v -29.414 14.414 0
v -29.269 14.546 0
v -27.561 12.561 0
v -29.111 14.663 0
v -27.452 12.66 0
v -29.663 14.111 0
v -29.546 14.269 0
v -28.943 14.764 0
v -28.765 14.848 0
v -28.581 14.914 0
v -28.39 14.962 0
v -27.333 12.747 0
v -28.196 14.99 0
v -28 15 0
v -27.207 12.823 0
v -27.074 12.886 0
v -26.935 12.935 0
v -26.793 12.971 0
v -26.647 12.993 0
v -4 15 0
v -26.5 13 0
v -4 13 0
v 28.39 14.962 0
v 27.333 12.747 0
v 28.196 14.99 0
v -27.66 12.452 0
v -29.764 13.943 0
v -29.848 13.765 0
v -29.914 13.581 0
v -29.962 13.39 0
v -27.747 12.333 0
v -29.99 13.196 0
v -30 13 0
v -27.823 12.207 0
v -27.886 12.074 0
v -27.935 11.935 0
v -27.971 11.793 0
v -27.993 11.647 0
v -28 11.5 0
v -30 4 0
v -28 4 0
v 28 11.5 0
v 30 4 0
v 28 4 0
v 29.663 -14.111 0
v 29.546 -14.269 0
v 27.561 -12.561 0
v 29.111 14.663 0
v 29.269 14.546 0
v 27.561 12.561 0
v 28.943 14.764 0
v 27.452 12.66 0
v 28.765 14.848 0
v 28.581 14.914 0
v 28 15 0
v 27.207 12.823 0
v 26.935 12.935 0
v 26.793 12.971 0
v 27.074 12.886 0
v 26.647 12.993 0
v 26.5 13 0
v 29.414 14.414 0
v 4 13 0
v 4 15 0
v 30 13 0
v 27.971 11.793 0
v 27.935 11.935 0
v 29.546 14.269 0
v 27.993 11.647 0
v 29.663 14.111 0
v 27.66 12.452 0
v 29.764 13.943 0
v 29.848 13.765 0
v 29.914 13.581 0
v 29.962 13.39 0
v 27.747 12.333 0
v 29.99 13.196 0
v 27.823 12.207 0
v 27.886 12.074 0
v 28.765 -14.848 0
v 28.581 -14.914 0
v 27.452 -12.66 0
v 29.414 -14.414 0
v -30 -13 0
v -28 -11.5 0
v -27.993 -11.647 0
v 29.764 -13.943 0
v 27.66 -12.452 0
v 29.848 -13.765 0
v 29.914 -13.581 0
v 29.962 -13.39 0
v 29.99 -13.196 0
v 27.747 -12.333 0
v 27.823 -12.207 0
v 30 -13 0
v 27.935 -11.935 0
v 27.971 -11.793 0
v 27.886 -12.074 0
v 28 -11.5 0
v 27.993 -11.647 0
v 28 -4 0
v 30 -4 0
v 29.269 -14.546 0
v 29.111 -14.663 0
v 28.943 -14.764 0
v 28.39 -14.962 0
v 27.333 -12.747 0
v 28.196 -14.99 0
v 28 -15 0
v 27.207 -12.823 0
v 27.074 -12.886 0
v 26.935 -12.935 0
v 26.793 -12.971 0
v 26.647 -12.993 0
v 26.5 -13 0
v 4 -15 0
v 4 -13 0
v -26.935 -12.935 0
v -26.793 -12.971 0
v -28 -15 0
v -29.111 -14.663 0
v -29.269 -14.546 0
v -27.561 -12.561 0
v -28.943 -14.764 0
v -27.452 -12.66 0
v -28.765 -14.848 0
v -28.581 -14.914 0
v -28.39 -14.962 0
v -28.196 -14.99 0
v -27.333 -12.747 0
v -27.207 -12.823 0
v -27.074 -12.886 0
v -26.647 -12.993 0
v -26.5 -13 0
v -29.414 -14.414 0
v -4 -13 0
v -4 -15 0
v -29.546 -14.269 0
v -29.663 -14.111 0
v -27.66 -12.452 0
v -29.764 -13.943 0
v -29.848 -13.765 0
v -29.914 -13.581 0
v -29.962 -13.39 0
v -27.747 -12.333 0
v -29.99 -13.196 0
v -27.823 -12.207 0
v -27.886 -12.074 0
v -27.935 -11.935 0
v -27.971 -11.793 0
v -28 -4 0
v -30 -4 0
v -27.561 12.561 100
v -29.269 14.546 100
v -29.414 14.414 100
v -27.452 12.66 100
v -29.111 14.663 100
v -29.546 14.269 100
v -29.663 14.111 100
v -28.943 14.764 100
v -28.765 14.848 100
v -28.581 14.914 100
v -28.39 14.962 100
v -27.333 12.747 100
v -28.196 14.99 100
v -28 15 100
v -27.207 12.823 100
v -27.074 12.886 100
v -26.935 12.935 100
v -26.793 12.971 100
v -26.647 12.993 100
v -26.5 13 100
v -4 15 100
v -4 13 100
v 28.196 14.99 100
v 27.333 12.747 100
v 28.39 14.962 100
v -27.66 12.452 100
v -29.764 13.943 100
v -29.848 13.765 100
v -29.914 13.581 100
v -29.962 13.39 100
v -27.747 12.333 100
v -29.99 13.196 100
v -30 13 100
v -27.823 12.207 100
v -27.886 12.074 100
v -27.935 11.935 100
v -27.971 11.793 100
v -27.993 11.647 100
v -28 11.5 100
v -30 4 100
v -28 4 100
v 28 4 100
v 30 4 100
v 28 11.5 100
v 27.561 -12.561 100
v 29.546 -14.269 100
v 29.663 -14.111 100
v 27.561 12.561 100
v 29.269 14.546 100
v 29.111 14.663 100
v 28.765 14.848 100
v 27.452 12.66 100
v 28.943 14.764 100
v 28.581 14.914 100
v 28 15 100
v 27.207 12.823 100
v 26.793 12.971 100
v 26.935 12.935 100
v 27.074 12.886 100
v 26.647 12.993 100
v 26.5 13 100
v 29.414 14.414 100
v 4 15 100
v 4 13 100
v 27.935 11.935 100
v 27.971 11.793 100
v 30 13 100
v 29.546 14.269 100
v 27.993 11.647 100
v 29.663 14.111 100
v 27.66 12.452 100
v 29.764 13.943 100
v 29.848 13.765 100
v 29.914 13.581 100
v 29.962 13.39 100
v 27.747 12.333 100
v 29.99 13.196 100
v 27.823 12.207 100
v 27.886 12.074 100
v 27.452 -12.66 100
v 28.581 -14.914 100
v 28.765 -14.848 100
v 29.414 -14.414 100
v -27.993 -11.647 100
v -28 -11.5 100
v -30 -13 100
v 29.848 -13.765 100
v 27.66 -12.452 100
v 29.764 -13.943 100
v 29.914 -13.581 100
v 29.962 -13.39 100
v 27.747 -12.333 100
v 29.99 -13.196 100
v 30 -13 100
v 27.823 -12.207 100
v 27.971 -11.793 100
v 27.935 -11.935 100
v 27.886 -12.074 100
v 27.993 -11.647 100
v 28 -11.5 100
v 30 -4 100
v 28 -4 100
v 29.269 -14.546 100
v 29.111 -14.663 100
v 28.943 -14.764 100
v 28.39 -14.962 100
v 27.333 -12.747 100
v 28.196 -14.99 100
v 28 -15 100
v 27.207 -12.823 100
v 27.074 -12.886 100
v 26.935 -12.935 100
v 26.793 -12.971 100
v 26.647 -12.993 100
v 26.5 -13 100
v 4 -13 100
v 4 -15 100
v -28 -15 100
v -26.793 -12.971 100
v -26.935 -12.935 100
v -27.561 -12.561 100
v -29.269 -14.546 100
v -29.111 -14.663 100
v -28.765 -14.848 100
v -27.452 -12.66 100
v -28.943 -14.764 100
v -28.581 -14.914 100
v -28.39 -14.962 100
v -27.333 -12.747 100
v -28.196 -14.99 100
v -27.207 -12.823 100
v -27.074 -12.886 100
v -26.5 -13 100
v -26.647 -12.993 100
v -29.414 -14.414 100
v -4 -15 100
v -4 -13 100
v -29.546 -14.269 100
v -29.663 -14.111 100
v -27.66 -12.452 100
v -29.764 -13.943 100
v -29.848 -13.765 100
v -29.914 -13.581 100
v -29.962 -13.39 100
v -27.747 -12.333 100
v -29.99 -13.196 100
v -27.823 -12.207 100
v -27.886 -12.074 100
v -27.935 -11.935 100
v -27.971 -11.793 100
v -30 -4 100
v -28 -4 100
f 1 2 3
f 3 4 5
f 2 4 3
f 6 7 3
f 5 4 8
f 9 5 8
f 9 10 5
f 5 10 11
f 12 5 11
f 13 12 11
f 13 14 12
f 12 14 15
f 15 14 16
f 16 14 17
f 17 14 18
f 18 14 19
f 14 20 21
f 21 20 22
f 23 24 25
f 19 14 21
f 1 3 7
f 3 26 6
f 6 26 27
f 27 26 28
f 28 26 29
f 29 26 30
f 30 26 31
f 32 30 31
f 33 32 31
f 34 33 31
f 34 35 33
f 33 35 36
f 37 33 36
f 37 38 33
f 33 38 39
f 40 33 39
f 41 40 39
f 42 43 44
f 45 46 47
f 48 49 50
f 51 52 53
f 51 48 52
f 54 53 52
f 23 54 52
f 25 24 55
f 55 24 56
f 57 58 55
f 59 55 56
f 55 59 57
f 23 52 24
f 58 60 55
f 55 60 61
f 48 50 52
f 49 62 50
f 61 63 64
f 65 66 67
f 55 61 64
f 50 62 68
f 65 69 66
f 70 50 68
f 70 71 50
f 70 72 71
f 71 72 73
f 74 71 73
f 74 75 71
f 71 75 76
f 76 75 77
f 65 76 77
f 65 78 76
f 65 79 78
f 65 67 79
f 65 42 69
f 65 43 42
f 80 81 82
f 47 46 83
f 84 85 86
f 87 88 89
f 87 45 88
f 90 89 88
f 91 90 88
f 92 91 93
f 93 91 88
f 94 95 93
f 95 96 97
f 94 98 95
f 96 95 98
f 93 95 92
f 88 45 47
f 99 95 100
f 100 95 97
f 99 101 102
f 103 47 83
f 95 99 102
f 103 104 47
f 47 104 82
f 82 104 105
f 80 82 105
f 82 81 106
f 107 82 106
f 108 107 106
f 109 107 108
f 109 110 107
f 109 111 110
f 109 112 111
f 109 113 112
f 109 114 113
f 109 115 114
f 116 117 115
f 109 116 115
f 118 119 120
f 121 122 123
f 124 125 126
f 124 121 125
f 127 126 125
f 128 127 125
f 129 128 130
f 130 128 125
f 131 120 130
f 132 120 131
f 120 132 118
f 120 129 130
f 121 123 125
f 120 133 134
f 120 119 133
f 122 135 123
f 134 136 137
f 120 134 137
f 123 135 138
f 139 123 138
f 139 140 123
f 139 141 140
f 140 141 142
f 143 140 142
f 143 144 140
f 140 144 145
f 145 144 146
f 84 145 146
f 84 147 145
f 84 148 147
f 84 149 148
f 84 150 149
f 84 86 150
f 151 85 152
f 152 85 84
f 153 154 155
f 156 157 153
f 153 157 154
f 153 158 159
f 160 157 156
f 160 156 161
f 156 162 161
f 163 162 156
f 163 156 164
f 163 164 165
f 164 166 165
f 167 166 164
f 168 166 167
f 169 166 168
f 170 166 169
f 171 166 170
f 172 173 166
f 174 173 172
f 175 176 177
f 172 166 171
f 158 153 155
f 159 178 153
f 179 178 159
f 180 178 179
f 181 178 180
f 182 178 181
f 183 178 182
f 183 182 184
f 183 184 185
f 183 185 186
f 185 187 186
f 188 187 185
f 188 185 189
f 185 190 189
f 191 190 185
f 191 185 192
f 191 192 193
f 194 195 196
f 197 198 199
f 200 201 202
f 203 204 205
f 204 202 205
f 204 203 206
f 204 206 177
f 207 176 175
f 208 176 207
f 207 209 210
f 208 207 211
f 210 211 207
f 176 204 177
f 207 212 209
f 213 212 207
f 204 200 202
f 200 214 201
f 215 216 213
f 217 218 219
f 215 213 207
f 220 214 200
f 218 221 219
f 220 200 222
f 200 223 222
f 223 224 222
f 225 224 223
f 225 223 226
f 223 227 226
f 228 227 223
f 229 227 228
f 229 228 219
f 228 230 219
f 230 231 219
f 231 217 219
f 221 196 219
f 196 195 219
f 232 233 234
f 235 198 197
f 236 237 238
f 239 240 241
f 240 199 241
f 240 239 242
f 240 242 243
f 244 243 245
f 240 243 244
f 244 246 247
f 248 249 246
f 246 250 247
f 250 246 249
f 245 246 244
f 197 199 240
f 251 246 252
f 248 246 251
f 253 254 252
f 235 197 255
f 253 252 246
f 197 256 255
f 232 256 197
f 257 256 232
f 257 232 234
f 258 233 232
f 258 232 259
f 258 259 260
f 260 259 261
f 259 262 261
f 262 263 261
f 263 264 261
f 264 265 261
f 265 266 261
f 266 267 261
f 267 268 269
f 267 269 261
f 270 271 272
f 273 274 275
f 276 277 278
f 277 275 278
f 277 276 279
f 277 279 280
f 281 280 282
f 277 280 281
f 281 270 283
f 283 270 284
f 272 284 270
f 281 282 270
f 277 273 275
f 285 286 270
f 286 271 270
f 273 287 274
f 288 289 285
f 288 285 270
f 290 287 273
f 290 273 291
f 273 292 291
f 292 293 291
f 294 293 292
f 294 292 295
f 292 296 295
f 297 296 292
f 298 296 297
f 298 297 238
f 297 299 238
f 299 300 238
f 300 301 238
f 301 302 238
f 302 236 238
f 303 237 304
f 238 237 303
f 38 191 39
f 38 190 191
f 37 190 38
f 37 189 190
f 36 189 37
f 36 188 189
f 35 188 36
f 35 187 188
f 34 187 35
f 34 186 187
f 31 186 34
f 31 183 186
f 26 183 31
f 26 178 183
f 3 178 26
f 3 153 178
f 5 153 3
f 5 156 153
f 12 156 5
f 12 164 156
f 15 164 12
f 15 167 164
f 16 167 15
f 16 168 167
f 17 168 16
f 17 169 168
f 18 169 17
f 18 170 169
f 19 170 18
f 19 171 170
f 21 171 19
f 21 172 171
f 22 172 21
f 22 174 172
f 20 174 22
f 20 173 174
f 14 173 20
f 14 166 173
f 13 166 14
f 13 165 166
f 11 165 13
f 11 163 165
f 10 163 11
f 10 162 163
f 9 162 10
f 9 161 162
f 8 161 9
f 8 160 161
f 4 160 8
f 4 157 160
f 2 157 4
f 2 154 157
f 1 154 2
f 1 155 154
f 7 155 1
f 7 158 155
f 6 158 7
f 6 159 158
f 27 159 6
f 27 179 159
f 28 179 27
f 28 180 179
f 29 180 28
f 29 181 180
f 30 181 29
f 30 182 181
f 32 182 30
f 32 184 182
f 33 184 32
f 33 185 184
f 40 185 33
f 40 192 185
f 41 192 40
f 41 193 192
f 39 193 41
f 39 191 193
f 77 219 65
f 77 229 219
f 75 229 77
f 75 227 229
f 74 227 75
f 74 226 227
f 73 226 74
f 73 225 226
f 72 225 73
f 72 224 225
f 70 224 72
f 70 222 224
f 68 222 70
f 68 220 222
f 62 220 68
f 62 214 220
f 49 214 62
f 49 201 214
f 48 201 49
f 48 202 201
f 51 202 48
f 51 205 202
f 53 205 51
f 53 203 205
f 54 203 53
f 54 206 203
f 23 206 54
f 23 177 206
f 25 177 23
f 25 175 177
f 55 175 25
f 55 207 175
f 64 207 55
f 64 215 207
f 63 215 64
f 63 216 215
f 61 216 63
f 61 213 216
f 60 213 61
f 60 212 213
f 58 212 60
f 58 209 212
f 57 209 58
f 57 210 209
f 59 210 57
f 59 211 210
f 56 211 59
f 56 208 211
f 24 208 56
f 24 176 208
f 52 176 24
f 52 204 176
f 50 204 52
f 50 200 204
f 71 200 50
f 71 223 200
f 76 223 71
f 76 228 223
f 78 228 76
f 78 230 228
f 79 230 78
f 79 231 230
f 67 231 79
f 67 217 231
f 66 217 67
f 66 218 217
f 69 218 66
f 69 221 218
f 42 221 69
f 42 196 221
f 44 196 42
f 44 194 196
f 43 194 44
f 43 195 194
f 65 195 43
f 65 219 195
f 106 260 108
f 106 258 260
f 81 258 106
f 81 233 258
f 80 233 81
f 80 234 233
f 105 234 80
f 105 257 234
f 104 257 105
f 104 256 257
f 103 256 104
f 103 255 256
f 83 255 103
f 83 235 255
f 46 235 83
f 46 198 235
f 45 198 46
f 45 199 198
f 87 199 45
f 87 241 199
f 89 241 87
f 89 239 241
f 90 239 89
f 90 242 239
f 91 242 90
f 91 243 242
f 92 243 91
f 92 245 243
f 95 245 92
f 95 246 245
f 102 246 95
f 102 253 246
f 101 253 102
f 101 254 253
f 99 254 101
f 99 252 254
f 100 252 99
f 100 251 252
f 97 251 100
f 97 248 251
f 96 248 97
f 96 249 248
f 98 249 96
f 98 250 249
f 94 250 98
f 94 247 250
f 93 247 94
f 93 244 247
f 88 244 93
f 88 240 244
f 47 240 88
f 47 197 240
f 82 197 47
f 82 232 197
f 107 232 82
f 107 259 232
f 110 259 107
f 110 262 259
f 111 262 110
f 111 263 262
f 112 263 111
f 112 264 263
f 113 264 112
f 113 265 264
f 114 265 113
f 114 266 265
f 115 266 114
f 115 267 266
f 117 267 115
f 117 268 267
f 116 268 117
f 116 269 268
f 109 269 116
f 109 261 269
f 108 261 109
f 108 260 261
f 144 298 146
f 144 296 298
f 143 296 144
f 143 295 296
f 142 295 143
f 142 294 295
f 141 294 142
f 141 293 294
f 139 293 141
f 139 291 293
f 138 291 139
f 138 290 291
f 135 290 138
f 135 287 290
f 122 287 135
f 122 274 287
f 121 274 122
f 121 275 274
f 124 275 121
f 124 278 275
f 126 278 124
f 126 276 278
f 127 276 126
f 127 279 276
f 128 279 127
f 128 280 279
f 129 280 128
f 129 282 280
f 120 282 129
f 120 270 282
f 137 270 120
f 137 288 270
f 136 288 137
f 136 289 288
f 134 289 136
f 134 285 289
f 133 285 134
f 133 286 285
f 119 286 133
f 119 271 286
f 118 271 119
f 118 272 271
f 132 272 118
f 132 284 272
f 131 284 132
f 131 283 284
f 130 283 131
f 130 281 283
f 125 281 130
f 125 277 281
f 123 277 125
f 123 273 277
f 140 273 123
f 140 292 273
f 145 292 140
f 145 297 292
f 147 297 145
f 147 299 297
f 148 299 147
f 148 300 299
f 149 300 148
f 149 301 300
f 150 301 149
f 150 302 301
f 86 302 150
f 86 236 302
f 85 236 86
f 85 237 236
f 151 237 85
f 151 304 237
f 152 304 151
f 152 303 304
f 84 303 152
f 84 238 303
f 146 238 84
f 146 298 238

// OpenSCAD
$fn = 64;

length = 100;
w = 60;
h = 30;

wall = 2.0;
slot_w = 8.0;
slot_depth = 6.0;
corner_r = 2.0;

module rounded_rect_2d(w, h, r) {
    r2 = min(r, min(w, h)/2);
    offset(r = r2) offset(delta = -r2) square([w, h], center = true);
}

module extrusion_3060_profile_2d() {
    difference() {
        // Outer body
        rounded_rect_2d(w, h, corner_r);

        // Inner hollow
        rounded_rect_2d(w - 2*wall, h - 2*wall, max(0, corner_r - 0.5));

        // T-slots (approximate) on all four sides
        // Top
        translate([0, h/2 - slot_depth/2])
            square([slot_w, slot_depth], center = true);

        // Bottom
        translate([0, -h/2 + slot_depth/2])
            square([slot_w, slot_depth], center = true);

        // Left
        translate([-w/2 + slot_depth/2, 0])
            square([slot_depth, slot_w], center = true);

        // Right
        translate([w/2 - slot_depth/2, 0])
            square([slot_depth, slot_w], center = true);

        // Central bore (typical-ish)
        circle(d = 6.0);
    }
}

linear_extrude(height = length, center = false, convexity = 10)
    extrusion_3060_profile_2d();
